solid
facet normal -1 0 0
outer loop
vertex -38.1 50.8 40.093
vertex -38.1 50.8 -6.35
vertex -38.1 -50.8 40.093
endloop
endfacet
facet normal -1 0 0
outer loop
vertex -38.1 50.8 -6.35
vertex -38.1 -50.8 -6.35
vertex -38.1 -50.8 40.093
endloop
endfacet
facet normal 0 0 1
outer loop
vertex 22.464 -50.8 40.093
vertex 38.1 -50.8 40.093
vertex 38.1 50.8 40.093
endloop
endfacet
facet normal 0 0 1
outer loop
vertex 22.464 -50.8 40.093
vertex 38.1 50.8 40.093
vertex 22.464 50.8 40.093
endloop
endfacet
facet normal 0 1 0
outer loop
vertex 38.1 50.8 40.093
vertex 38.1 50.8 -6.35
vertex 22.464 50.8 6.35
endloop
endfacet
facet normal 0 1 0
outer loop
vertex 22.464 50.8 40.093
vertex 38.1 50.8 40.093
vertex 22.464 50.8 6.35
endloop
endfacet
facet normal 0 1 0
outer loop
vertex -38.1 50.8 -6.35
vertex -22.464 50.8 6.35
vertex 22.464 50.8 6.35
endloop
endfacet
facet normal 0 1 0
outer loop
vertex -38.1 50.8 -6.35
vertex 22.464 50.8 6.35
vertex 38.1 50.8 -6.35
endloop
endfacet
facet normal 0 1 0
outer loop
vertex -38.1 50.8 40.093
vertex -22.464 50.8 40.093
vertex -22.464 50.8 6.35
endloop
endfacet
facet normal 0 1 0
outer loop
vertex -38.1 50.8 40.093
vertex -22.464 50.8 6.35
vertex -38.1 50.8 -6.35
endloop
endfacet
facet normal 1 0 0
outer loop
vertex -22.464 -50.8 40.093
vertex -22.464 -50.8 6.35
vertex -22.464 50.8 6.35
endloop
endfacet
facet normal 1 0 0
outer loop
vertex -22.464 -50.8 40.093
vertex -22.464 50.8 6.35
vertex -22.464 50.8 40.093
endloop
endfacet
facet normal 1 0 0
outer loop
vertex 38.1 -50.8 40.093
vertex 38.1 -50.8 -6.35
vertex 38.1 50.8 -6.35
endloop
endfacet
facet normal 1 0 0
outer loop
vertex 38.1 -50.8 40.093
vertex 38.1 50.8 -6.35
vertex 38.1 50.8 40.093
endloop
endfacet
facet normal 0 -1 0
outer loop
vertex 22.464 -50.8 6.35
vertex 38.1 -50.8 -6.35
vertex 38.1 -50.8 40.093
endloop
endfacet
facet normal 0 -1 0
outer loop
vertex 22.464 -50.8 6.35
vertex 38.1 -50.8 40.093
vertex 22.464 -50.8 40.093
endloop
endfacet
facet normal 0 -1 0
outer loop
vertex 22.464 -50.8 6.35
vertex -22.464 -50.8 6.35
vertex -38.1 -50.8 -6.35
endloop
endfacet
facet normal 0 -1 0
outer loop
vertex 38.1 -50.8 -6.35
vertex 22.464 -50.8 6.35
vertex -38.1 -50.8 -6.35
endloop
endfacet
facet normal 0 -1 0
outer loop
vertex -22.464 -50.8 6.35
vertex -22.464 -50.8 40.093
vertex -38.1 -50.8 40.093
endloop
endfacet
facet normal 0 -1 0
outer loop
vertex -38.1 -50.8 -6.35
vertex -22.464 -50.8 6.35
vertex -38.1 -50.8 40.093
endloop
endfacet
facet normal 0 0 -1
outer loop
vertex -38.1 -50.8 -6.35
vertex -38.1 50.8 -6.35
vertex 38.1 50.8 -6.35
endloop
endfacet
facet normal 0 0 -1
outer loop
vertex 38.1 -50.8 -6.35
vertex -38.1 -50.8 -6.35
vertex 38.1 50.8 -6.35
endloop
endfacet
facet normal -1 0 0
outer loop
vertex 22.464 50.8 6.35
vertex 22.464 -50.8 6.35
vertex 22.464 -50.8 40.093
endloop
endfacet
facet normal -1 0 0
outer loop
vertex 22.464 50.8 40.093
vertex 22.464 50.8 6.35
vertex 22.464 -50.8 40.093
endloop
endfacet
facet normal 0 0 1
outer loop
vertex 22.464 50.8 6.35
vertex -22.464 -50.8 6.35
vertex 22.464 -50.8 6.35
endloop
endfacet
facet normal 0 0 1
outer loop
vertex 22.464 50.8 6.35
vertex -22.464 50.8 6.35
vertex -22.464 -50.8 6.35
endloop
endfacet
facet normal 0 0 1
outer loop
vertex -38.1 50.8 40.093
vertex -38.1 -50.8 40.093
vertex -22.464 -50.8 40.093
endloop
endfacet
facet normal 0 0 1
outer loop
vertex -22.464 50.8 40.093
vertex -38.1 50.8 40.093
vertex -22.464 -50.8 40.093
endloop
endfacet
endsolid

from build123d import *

# Parameters (mm, degrees)
F1_DEPTH = 6.35
F2_W     = 15.6363076478
F2_H     = 33.7427960873
F3_DEPTH = 101.6


with BuildPart() as f1:
    # F0 (on Top) → F1 (new body, symmetric)
    with BuildSketch(Plane.XY):
        Polygon((38.1, 50.8), (0, 50.8), (-38.1, 50.8), (-38.1, 0), (-38.1, -50.8), (0, -50.8), (38.1, -50.8), (38.1, 0), align=None)
    extrude(amount=F1_DEPTH, both=True)

    # F2 (on face) → F3 (join)
    with BuildSketch(Plane.XZ.offset(50.8)):
        with Locations((-30.2818461761, 23.2213980436)):
            Rectangle(F2_W, F2_H)
    extrude(amount=-F3_DEPTH)

    # F4: F1 across plane


with BuildPart() as f1_1:
    add(f1.part)
    add(f1.part.mirror(Plane.YZ))


solid = f1_1.part
